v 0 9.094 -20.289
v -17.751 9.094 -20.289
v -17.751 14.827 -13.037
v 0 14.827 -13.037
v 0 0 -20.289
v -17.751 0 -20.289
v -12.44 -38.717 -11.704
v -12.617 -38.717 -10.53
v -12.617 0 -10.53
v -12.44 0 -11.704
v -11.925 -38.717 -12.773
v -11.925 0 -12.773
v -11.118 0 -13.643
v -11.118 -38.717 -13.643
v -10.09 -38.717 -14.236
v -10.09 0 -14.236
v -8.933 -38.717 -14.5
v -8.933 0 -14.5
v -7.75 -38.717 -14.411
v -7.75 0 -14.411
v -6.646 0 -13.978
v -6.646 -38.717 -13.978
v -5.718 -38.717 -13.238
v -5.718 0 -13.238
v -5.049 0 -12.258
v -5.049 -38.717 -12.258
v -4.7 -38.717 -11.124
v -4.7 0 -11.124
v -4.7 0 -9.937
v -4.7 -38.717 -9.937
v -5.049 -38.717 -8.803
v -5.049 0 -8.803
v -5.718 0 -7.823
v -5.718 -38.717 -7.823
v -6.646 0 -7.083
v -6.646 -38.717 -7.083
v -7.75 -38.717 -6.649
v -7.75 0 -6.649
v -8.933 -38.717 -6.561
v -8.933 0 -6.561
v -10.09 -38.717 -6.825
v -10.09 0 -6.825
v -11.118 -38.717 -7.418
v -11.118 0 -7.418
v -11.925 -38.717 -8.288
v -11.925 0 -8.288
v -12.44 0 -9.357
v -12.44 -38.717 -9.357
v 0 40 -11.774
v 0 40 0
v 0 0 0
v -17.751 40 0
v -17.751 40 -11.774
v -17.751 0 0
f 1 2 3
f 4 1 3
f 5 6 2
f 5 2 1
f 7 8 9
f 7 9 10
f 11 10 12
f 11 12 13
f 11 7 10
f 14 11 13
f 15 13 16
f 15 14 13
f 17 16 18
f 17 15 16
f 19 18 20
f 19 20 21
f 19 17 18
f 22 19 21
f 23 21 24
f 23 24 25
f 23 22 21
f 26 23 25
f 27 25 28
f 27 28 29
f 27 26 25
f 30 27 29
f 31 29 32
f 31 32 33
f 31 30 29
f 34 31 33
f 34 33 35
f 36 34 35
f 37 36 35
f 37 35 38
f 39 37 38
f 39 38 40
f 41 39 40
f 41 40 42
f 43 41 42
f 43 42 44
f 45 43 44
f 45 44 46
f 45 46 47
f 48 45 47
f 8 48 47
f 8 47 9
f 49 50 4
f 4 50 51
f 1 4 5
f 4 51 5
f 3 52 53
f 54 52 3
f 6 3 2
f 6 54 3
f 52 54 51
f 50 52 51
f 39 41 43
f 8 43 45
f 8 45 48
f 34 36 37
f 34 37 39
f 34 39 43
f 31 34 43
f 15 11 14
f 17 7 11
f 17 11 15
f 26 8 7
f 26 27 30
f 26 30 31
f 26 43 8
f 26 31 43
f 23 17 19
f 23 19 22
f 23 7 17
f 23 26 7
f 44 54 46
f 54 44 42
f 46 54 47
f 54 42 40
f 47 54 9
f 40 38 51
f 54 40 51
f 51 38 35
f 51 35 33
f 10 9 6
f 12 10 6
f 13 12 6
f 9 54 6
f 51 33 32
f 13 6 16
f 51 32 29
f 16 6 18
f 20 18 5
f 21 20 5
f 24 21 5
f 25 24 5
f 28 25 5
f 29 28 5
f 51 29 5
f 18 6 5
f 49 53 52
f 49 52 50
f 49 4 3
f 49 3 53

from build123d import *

# Parameters (mm, degrees)
SKETCH1_W           = 17.751360412
SKETCH1_H           = 20.289442188
BOSS_EXTRUDE1_DEPTH = 40
SKETCH2_R           = 3.980814887
CUT_EXTRUDE1_DEPTH  = 40


with BuildPart() as part:
    # Sketch1 → Boss-Extrude1 (new body)
    with BuildSketch(Plane(origin=(0, 0, 0), x_dir=(1, 0, 0), z_dir=(0, 1, 0))):
        with Locations((-8.875680206, 10.144721094)):
            Rectangle(SKETCH1_W, SKETCH1_H)
    extrude(amount=BOSS_EXTRUDE1_DEPTH)

    # Sweep1: sweep along a curve in space
    with BuildLine() as sweep1_path:
        Line((-8.636006498, 0, -10.530435866), (-8.636006498, -38.716526094, -10.530435866))
    # Sketch2 → Sweep1 (sweep)
    with BuildSketch(Plane(origin=(0, 0, 0), x_dir=(-1, 0, 0), z_dir=(0, -1, 0))):
        with Locations((8.636006498, 10.530435866)):
            Circle(SKETCH2_R)
    sweep(path=sweep1_path.line)

    # Sketch3 → Cut-Extrude1 (cut)
    with BuildSketch(Plane(origin=(0, 0, 0), x_dir=(0, 0, -1), z_dir=(1, 0, 0))):
        Polygon((27.331751958, 3.526611328), (13.036737594, 14.826732859), (11.549169686, 44.474117194), (29.802797672, 42.721399119), align=None)
    extrude(amount=-CUT_EXTRUDE1_DEPTH, mode=Mode.SUBTRACT)


solid = part.part
